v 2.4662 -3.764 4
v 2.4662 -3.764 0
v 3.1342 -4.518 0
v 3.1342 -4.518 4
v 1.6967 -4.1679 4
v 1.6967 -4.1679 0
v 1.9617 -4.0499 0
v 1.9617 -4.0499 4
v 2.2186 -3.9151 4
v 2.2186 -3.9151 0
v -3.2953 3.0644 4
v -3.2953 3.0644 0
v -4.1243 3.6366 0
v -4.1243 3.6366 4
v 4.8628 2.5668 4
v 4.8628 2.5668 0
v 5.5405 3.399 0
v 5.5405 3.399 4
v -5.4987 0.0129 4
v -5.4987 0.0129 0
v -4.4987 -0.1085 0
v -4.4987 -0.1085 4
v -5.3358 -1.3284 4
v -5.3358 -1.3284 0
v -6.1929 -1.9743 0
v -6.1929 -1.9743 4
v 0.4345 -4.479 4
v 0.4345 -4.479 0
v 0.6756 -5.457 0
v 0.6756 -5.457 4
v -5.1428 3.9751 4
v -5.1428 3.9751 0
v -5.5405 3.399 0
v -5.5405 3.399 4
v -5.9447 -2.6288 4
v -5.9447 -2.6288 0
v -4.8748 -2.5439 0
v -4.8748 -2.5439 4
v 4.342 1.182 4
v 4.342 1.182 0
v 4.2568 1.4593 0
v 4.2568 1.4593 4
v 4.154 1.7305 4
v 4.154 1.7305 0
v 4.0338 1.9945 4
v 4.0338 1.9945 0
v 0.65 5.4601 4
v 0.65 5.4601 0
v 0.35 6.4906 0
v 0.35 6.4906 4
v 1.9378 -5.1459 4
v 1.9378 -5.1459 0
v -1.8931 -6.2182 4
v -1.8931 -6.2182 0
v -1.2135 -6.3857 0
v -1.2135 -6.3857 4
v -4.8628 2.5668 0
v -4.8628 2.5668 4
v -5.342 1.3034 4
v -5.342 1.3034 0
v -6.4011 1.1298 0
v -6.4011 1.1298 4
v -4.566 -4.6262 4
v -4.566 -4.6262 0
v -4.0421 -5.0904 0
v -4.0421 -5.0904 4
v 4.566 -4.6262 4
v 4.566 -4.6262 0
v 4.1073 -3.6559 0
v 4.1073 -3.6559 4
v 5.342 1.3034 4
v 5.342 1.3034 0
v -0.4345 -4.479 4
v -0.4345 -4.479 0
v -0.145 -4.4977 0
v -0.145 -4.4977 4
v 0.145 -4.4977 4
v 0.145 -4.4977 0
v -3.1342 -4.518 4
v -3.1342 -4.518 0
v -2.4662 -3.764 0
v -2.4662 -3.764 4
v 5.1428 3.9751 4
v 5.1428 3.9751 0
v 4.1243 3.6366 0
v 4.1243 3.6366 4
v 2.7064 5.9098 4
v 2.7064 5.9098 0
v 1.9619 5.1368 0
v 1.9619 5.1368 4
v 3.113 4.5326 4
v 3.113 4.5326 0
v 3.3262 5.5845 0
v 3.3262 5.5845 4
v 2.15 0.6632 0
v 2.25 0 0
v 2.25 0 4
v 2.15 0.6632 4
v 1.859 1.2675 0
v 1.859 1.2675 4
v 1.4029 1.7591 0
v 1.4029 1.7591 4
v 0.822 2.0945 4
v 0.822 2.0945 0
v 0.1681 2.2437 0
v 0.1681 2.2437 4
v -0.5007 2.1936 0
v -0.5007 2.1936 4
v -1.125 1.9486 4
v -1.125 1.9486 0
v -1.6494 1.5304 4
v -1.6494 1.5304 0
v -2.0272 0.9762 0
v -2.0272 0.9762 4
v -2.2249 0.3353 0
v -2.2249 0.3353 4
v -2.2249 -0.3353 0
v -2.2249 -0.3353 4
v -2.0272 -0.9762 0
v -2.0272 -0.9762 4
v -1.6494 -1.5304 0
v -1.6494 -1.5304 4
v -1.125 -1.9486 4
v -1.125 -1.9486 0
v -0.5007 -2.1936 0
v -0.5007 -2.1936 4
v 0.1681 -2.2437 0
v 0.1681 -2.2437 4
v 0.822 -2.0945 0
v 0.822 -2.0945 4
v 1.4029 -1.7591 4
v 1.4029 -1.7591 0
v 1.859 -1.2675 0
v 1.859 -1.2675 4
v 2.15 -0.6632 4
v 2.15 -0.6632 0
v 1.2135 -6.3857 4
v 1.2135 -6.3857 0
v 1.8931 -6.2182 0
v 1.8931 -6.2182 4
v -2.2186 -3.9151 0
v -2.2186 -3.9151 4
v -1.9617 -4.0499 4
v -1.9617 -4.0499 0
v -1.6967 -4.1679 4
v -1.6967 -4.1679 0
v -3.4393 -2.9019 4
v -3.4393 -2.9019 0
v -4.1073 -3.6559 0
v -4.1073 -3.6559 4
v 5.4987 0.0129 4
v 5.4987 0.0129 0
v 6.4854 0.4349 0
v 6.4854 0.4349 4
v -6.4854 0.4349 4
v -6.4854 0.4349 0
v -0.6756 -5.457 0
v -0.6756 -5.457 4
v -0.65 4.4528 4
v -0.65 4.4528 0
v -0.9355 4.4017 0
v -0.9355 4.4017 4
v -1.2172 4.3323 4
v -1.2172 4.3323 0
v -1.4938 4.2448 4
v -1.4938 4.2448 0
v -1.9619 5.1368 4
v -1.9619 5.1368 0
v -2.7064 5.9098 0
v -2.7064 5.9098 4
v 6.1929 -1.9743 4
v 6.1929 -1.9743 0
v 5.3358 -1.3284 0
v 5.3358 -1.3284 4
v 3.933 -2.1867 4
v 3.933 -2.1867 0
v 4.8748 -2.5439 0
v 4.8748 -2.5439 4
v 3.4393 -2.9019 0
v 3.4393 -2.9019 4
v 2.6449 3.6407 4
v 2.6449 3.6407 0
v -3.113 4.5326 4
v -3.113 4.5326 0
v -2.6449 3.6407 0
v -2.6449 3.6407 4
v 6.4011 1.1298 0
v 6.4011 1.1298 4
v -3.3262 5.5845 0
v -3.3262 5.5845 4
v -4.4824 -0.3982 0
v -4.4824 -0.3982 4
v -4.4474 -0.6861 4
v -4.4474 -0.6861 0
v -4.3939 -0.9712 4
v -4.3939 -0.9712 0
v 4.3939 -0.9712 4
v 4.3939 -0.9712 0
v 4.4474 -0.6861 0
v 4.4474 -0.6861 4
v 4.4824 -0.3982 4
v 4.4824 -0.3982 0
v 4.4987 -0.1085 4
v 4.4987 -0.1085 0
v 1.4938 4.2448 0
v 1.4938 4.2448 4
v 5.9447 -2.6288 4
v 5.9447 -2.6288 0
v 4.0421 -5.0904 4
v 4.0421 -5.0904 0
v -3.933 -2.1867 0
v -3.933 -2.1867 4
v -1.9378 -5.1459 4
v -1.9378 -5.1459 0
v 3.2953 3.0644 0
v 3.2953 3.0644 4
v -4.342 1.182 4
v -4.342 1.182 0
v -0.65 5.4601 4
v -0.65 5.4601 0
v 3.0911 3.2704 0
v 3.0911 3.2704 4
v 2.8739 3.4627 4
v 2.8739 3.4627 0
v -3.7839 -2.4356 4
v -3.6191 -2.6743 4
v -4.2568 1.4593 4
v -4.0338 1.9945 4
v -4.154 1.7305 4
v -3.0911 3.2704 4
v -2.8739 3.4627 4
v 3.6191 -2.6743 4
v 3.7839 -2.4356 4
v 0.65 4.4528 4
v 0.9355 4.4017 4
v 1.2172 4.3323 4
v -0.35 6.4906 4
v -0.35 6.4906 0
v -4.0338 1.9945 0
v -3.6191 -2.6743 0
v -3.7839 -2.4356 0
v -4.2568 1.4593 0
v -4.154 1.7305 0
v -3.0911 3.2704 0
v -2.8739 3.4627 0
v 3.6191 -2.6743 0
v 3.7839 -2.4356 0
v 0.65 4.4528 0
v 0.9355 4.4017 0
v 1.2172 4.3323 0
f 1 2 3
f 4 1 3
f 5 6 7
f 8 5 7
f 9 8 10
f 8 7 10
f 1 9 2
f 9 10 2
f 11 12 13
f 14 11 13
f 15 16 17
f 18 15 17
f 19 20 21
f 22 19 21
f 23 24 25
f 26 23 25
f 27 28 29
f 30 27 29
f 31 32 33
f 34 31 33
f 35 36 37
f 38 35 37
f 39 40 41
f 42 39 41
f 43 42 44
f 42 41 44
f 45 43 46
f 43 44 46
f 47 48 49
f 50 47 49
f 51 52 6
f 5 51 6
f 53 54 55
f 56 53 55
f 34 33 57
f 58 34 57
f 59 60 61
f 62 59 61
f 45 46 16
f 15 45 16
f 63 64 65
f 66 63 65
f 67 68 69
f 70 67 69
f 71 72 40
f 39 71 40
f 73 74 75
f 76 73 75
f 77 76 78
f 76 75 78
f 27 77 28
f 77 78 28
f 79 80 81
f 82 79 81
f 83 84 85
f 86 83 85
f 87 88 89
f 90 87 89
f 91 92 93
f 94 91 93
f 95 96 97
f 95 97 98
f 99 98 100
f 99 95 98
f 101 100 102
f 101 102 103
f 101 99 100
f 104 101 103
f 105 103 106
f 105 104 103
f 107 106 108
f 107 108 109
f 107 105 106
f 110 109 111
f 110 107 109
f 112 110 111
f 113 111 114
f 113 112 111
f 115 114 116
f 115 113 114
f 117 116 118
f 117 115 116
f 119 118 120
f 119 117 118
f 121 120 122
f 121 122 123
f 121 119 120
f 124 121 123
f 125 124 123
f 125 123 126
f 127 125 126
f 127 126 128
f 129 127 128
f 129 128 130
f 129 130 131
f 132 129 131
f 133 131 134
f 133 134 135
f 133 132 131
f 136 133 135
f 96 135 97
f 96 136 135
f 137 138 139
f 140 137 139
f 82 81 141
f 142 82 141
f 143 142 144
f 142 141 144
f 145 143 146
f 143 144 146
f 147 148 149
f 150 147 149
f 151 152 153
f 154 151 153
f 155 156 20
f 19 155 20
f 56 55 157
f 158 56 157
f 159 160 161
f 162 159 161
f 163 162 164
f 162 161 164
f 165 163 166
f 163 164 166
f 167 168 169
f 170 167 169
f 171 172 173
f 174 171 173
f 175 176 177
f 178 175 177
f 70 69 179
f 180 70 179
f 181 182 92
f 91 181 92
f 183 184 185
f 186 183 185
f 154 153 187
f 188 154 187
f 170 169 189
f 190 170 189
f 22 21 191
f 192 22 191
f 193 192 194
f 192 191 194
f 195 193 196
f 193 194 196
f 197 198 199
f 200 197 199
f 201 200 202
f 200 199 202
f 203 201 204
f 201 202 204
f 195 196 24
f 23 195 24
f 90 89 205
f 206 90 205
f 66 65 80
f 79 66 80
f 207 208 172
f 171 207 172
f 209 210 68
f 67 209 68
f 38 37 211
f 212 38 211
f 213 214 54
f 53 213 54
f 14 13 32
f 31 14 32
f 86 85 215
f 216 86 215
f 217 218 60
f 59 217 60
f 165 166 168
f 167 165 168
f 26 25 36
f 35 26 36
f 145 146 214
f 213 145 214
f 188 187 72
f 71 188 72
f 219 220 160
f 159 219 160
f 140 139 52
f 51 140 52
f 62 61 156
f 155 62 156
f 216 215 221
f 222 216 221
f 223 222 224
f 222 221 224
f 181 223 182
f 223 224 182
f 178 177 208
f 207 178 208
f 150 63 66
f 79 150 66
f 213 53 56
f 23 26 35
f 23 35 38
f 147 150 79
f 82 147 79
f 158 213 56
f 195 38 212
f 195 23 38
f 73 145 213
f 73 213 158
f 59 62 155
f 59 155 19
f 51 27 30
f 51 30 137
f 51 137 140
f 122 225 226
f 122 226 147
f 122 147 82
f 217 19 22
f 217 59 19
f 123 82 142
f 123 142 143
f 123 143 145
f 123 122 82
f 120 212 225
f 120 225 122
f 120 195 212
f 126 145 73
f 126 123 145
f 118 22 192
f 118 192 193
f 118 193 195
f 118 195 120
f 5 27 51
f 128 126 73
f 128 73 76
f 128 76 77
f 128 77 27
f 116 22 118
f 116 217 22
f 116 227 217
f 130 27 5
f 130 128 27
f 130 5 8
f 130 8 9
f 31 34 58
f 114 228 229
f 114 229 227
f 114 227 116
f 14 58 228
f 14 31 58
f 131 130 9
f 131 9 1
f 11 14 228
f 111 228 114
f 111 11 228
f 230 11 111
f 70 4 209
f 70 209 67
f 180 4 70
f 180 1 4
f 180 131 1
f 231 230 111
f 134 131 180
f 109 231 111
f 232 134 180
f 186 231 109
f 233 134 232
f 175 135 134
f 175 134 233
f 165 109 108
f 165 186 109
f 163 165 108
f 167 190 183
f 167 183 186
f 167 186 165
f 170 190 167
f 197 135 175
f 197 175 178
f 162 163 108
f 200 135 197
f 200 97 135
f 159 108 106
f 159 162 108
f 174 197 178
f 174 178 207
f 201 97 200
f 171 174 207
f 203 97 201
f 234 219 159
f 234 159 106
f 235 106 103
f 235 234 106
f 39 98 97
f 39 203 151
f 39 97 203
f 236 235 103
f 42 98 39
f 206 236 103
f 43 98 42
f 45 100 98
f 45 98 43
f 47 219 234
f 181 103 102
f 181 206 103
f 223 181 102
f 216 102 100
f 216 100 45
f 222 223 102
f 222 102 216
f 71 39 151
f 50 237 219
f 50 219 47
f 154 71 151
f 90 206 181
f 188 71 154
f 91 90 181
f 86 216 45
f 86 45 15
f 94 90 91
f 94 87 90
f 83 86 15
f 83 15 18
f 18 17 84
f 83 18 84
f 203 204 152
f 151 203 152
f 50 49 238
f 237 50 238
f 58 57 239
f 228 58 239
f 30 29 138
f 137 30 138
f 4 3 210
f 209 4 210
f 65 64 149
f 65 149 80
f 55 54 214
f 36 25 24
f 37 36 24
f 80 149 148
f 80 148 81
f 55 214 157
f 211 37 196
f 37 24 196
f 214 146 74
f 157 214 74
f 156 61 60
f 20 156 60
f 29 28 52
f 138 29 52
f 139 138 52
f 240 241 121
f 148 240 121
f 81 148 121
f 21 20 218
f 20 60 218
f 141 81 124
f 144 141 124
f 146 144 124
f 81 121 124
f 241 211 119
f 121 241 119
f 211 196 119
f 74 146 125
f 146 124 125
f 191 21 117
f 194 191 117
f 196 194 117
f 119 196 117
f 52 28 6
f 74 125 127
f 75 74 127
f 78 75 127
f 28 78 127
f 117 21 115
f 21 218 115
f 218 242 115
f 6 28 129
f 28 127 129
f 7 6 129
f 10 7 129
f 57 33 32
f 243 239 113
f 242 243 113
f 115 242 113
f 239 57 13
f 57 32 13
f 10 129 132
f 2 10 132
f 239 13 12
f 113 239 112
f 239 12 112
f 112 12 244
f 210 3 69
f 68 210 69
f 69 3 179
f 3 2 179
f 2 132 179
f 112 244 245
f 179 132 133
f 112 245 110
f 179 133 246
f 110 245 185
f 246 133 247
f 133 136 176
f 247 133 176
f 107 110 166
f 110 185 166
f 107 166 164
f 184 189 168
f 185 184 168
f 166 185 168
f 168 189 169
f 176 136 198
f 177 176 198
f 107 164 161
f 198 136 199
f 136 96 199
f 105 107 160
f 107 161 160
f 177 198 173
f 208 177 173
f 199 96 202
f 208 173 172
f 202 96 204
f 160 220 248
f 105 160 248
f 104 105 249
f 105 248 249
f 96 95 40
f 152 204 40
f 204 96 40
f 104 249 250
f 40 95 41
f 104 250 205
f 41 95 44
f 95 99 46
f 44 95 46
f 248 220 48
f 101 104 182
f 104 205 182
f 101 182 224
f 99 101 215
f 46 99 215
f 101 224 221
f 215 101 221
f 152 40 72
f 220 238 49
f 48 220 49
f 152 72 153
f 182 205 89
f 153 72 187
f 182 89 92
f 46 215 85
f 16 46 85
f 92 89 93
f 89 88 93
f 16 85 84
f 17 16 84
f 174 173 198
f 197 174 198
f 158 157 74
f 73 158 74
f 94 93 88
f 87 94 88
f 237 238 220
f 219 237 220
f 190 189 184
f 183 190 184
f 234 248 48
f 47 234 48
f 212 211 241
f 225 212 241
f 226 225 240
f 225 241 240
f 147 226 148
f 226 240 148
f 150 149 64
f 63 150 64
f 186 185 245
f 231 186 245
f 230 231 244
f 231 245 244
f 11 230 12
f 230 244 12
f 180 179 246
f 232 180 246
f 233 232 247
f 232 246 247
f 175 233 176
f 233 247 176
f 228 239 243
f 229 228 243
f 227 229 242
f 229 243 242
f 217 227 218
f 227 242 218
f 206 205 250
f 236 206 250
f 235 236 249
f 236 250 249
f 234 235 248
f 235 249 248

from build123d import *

# Parameters (mm, degrees)
SZKIC1_R                    = 2.25
DODANIE_WYCI_GNI_CIE1_DEPTH = 4


with BuildPart() as part:
    # Szkic1 → Dodanie-wyciągnięcie1 (new body)
    with BuildSketch(Plane.XY):
        with BuildLine():
            Line((-0.65, 5.460113222), (-0.65, 4.452808103))
            ThreePointArc((-0.65, 4.452808103), (-1.076920489, 4.369238178), (-1.493776689, 4.244835827))
            Line((-1.493776689, 4.244835827), (-1.96189472, 5.136760215))
            Line((-1.96189472, 5.136760215), (-2.706408708, 5.9097675))
            Line((-2.706408708, 5.9097675), (-3.326227926, 5.58446128))
            Line((-3.326227926, 5.58446128), (-3.112987553, 4.532620091))
            Line((-3.112987553, 4.532620091), (-2.644869523, 3.640695704))
            ThreePointArc((-2.644869523, 3.640695704), (-2.984051962, 3.368298367), (-3.295347141, 3.06442282))
            Line((-3.295347141, 3.06442282), (-4.124343002, 3.636637347))
            Line((-4.124343002, 3.636637347), (-5.142811797, 3.975108403))
            Line((-5.142811797, 3.975108403), (-5.54045712, 3.399019697))
            Line((-5.54045712, 3.399019697), (-4.862827173, 2.566758322))
            Line((-4.862827173, 2.566758322), (-4.033831312, 1.994543794))
            ThreePointArc((-4.033831312, 1.994543794), (-4.207573092, 1.595721992), (-4.341993276, 1.181987475))
            Line((-4.341993276, 1.181987475), (-5.341954007, 1.30340469))
            Line((-5.341954007, 1.30340469), (-6.401058681, 1.129799877))
            Line((-6.401058681, 1.129799877), (-6.485434357, 0.434903665))
            Line((-6.485434357, 0.434903665), (-5.498651691, 0.012883153))
            Line((-5.498651691, 0.012883153), (-4.49869096, -0.108534062))
            ThreePointArc((-4.49869096, -0.108534062), (-4.467189933, -0.542415061), (-4.393941078, -0.971226957))
            Line((-4.393941078, -0.971226957), (-5.335787726, -1.328422275))
            Line((-5.335787726, -1.328422275), (-6.192900162, -1.974332186))
            Line((-6.192900162, -1.974332186), (-5.944676741, -2.628843556))
            Line((-5.944676741, -2.628843556), (-4.874801373, -2.54394339))
            Line((-4.874801373, -2.54394339), (-3.932954725, -2.186748072))
            ThreePointArc((-3.932954725, -2.186748072), (-3.703427397, -2.55629136), (-3.439289932, -2.901944997))
            Line((-3.439289932, -2.901944997), (-4.10725678, -3.655923705))
            Line((-4.10725678, -3.655923705), (-4.566022849, -4.626168538))
            Line((-4.566022849, -4.626168538), (-4.042065325, -5.090354399))
            Line((-4.042065325, -5.090354399), (-3.134192808, -4.517983161))
            Line((-3.134192808, -4.517983161), (-2.466225959, -3.764004452))
            ThreePointArc((-2.466225959, -3.764004452), (-2.091254274, -3.984552115), (-1.69673891, -4.16786241))
            Line((-1.69673891, -4.16786241), (-1.937802804, -5.145897073))
            Line((-1.937802804, -5.145897073), (-1.893124727, -6.21820543))
            Line((-1.893124727, -6.21820543), (-1.213465455, -6.385726395))
            Line((-1.213465455, -6.385726395), (-0.675578441, -5.457007437))
            Line((-0.675578441, -5.457007437), (-0.434514548, -4.478972774))
            ThreePointArc((-0.434514548, -4.478972774), (0, -4.5), (0.434514548, -4.478972774))
            Line((0.434514548, -4.478972774), (0.675578441, -5.457007437))
            Line((0.675578441, -5.457007437), (1.213465455, -6.385726395))
            Line((1.213465455, -6.385726395), (1.893124727, -6.21820543))
            Line((1.893124727, -6.21820543), (1.937802804, -5.145897073))
            Line((1.937802804, -5.145897073), (1.69673891, -4.16786241))
            ThreePointArc((1.69673891, -4.16786241), (2.091254274, -3.984552115), (2.466225959, -3.764004452))
            Line((2.466225959, -3.764004452), (3.134192808, -4.517983161))
            Line((3.134192808, -4.517983161), (4.042065325, -5.090354399))
            Line((4.042065325, -5.090354399), (4.566022849, -4.626168538))
            Line((4.566022849, -4.626168538), (4.10725678, -3.655923705))
            Line((4.10725678, -3.655923705), (3.439289932, -2.901944997))
            ThreePointArc((3.439289932, -2.901944997), (3.703427397, -2.55629136), (3.932954725, -2.186748072))
            Line((3.932954725, -2.186748072), (4.874801373, -2.54394339))
            Line((4.874801373, -2.54394339), (5.944676741, -2.628843556))
            Line((5.944676741, -2.628843556), (6.192900162, -1.974332186))
            Line((6.192900162, -1.974332186), (5.335787726, -1.328422275))
            Line((5.335787726, -1.328422275), (4.393941078, -0.971226957))
            ThreePointArc((4.393941078, -0.971226957), (4.467189933, -0.542415061), (4.49869096, -0.108534062))
            Line((4.49869096, -0.108534062), (5.498651691, 0.012883153))
            Line((5.498651691, 0.012883153), (6.485434357, 0.434903665))
            Line((6.485434357, 0.434903665), (6.401058681, 1.129799877))
            Line((6.401058681, 1.129799877), (5.341954007, 1.30340469))
            Line((5.341954007, 1.30340469), (4.341993276, 1.181987475))
            ThreePointArc((4.341993276, 1.181987475), (4.207573092, 1.595721992), (4.033831312, 1.994543794))
            Line((4.033831312, 1.994543794), (4.862827173, 2.566758322))
            Line((4.862827173, 2.566758322), (5.54045712, 3.399019697))
            Line((5.54045712, 3.399019697), (5.142811797, 3.975108403))
            Line((5.142811797, 3.975108403), (4.124343002, 3.636637347))
            Line((4.124343002, 3.636637347), (3.295347141, 3.06442282))
            ThreePointArc((3.295347141, 3.06442282), (2.984051962, 3.368298367), (2.644869523, 3.640695704))
            Line((2.644869523, 3.640695704), (3.112987553, 4.532620091))
            Line((3.112987553, 4.532620091), (3.326227926, 5.58446128))
            Line((3.326227926, 5.58446128), (2.706408708, 5.9097675))
            Line((2.706408708, 5.9097675), (1.96189472, 5.136760215))
            Line((1.96189472, 5.136760215), (1.493776689, 4.244835827))
            ThreePointArc((1.493776689, 4.244835827), (1.076920489, 4.369238178), (0.65, 4.452808103))
            Line((0.65, 4.452808103), (0.65, 5.460113222))
            Line((0.65, 5.460113222), (0.35, 6.490570083))
            Line((0.35, 6.490570083), (-0.35, 6.490570083))
            Line((-0.35, 6.490570083), (-0.65, 5.460113222))
        make_face()
        Circle(SZKIC1_R, mode=Mode.SUBTRACT)
    extrude(amount=DODANIE_WYCI_GNI_CIE1_DEPTH)


solid = part.part
